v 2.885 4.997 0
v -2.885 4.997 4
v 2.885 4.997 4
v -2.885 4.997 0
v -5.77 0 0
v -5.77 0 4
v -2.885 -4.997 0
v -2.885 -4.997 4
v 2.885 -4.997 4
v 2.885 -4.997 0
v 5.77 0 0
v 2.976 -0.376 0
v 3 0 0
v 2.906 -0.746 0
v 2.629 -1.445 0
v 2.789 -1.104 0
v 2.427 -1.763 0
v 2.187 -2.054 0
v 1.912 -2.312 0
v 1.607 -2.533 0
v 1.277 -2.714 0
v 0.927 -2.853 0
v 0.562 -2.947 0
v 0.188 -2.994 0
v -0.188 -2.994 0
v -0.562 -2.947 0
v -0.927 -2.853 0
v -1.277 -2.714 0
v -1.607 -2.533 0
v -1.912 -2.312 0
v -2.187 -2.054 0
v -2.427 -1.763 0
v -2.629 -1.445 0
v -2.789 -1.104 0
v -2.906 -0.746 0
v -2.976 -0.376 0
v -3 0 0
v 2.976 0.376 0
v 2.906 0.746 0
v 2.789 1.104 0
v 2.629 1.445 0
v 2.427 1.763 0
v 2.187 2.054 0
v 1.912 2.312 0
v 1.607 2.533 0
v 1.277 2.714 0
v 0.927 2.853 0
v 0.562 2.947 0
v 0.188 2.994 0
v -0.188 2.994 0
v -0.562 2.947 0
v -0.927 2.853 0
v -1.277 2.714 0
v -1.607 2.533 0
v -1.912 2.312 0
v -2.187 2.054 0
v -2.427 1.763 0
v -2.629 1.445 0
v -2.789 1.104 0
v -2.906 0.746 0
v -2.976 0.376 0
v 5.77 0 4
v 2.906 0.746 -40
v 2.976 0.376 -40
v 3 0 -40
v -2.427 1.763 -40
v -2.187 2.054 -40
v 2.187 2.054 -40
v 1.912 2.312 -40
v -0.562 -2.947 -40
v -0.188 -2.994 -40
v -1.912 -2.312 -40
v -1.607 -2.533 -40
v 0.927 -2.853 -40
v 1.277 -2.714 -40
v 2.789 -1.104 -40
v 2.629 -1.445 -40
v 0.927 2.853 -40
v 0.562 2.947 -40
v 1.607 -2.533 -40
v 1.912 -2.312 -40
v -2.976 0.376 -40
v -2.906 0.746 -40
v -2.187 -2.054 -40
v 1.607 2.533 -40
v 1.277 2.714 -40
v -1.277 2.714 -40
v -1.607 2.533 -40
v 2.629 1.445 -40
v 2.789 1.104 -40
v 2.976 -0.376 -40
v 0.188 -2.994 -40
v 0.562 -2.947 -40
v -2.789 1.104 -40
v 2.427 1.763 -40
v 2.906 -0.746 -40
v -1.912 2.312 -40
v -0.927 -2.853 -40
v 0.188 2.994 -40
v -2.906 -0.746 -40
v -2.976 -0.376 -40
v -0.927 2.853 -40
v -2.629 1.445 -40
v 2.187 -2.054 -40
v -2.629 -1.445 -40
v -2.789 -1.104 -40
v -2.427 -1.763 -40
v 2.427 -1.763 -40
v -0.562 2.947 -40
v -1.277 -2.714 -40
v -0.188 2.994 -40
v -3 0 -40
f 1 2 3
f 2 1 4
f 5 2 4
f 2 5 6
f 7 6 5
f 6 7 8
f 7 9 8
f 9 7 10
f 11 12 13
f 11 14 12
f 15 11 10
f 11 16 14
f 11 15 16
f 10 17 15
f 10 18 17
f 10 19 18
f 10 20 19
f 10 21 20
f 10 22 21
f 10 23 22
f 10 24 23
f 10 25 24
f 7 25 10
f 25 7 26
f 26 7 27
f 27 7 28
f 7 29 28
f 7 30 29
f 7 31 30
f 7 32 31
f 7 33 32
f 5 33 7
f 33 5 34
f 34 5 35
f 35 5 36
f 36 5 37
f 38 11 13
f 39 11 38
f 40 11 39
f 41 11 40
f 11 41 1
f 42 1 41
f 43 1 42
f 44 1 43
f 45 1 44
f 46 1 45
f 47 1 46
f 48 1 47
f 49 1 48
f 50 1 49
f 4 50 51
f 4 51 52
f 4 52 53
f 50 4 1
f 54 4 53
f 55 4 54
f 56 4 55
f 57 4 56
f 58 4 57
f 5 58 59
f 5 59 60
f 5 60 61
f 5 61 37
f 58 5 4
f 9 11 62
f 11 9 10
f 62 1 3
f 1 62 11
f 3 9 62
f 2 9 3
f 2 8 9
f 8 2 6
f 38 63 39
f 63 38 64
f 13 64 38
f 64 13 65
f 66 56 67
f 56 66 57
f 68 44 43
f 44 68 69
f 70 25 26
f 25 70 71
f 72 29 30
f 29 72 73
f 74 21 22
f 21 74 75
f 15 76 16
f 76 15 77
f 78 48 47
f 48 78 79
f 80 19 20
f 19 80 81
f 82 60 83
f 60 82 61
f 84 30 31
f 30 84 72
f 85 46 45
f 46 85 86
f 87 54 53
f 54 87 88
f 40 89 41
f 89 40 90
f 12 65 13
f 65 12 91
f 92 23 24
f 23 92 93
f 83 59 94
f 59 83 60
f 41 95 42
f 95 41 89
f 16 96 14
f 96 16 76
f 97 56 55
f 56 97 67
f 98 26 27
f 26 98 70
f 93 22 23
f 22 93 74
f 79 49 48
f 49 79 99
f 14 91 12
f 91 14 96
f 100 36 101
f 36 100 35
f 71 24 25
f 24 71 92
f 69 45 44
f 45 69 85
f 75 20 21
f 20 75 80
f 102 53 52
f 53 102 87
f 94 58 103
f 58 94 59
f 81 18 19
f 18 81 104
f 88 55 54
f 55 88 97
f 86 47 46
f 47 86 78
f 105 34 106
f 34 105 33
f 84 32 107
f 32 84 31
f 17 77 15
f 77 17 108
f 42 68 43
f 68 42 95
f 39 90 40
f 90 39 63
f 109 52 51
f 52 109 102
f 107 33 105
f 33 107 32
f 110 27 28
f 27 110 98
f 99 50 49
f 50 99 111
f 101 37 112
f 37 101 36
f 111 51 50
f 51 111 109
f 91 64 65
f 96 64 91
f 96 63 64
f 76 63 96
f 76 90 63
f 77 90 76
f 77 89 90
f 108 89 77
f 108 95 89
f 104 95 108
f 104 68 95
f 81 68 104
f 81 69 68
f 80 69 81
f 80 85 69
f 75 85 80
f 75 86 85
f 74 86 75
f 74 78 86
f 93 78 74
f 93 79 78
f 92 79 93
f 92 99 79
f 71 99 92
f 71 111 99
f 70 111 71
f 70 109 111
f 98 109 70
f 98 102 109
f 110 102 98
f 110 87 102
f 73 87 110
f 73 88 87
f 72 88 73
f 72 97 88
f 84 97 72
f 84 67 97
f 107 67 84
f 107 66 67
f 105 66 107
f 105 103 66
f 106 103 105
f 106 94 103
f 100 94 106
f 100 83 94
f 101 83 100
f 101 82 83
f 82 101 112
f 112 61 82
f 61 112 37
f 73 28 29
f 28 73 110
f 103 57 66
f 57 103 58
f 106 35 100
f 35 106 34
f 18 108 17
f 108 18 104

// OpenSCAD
$fn = 50;


difference() {
	union() {
		translate(v = [0, 0, 0]) {
			rotate(a = [0, 0, 0]) {
				translate(v = [0, 0, 0]) {
					rotate(a = [0, 0, 0]) {
						linear_extrude(height = 4) {
							polygon(points = [[5.7700000000, 0.0000000000], [2.8850000000, 4.9969665798], [-2.8850000000, 4.9969665798], [-5.7700000000, 0.0000000000], [-2.8850000000, -4.9969665798], [2.8850000000, -4.9969665798]]);
						}
					}
				}
			}
		}
		translate(v = [0, 0, -40]) {
			rotate(a = [0, 0, 0]) {
				cylinder(h = 40, r = 3.0000000000);
			}
		}
	}
	union();
}
